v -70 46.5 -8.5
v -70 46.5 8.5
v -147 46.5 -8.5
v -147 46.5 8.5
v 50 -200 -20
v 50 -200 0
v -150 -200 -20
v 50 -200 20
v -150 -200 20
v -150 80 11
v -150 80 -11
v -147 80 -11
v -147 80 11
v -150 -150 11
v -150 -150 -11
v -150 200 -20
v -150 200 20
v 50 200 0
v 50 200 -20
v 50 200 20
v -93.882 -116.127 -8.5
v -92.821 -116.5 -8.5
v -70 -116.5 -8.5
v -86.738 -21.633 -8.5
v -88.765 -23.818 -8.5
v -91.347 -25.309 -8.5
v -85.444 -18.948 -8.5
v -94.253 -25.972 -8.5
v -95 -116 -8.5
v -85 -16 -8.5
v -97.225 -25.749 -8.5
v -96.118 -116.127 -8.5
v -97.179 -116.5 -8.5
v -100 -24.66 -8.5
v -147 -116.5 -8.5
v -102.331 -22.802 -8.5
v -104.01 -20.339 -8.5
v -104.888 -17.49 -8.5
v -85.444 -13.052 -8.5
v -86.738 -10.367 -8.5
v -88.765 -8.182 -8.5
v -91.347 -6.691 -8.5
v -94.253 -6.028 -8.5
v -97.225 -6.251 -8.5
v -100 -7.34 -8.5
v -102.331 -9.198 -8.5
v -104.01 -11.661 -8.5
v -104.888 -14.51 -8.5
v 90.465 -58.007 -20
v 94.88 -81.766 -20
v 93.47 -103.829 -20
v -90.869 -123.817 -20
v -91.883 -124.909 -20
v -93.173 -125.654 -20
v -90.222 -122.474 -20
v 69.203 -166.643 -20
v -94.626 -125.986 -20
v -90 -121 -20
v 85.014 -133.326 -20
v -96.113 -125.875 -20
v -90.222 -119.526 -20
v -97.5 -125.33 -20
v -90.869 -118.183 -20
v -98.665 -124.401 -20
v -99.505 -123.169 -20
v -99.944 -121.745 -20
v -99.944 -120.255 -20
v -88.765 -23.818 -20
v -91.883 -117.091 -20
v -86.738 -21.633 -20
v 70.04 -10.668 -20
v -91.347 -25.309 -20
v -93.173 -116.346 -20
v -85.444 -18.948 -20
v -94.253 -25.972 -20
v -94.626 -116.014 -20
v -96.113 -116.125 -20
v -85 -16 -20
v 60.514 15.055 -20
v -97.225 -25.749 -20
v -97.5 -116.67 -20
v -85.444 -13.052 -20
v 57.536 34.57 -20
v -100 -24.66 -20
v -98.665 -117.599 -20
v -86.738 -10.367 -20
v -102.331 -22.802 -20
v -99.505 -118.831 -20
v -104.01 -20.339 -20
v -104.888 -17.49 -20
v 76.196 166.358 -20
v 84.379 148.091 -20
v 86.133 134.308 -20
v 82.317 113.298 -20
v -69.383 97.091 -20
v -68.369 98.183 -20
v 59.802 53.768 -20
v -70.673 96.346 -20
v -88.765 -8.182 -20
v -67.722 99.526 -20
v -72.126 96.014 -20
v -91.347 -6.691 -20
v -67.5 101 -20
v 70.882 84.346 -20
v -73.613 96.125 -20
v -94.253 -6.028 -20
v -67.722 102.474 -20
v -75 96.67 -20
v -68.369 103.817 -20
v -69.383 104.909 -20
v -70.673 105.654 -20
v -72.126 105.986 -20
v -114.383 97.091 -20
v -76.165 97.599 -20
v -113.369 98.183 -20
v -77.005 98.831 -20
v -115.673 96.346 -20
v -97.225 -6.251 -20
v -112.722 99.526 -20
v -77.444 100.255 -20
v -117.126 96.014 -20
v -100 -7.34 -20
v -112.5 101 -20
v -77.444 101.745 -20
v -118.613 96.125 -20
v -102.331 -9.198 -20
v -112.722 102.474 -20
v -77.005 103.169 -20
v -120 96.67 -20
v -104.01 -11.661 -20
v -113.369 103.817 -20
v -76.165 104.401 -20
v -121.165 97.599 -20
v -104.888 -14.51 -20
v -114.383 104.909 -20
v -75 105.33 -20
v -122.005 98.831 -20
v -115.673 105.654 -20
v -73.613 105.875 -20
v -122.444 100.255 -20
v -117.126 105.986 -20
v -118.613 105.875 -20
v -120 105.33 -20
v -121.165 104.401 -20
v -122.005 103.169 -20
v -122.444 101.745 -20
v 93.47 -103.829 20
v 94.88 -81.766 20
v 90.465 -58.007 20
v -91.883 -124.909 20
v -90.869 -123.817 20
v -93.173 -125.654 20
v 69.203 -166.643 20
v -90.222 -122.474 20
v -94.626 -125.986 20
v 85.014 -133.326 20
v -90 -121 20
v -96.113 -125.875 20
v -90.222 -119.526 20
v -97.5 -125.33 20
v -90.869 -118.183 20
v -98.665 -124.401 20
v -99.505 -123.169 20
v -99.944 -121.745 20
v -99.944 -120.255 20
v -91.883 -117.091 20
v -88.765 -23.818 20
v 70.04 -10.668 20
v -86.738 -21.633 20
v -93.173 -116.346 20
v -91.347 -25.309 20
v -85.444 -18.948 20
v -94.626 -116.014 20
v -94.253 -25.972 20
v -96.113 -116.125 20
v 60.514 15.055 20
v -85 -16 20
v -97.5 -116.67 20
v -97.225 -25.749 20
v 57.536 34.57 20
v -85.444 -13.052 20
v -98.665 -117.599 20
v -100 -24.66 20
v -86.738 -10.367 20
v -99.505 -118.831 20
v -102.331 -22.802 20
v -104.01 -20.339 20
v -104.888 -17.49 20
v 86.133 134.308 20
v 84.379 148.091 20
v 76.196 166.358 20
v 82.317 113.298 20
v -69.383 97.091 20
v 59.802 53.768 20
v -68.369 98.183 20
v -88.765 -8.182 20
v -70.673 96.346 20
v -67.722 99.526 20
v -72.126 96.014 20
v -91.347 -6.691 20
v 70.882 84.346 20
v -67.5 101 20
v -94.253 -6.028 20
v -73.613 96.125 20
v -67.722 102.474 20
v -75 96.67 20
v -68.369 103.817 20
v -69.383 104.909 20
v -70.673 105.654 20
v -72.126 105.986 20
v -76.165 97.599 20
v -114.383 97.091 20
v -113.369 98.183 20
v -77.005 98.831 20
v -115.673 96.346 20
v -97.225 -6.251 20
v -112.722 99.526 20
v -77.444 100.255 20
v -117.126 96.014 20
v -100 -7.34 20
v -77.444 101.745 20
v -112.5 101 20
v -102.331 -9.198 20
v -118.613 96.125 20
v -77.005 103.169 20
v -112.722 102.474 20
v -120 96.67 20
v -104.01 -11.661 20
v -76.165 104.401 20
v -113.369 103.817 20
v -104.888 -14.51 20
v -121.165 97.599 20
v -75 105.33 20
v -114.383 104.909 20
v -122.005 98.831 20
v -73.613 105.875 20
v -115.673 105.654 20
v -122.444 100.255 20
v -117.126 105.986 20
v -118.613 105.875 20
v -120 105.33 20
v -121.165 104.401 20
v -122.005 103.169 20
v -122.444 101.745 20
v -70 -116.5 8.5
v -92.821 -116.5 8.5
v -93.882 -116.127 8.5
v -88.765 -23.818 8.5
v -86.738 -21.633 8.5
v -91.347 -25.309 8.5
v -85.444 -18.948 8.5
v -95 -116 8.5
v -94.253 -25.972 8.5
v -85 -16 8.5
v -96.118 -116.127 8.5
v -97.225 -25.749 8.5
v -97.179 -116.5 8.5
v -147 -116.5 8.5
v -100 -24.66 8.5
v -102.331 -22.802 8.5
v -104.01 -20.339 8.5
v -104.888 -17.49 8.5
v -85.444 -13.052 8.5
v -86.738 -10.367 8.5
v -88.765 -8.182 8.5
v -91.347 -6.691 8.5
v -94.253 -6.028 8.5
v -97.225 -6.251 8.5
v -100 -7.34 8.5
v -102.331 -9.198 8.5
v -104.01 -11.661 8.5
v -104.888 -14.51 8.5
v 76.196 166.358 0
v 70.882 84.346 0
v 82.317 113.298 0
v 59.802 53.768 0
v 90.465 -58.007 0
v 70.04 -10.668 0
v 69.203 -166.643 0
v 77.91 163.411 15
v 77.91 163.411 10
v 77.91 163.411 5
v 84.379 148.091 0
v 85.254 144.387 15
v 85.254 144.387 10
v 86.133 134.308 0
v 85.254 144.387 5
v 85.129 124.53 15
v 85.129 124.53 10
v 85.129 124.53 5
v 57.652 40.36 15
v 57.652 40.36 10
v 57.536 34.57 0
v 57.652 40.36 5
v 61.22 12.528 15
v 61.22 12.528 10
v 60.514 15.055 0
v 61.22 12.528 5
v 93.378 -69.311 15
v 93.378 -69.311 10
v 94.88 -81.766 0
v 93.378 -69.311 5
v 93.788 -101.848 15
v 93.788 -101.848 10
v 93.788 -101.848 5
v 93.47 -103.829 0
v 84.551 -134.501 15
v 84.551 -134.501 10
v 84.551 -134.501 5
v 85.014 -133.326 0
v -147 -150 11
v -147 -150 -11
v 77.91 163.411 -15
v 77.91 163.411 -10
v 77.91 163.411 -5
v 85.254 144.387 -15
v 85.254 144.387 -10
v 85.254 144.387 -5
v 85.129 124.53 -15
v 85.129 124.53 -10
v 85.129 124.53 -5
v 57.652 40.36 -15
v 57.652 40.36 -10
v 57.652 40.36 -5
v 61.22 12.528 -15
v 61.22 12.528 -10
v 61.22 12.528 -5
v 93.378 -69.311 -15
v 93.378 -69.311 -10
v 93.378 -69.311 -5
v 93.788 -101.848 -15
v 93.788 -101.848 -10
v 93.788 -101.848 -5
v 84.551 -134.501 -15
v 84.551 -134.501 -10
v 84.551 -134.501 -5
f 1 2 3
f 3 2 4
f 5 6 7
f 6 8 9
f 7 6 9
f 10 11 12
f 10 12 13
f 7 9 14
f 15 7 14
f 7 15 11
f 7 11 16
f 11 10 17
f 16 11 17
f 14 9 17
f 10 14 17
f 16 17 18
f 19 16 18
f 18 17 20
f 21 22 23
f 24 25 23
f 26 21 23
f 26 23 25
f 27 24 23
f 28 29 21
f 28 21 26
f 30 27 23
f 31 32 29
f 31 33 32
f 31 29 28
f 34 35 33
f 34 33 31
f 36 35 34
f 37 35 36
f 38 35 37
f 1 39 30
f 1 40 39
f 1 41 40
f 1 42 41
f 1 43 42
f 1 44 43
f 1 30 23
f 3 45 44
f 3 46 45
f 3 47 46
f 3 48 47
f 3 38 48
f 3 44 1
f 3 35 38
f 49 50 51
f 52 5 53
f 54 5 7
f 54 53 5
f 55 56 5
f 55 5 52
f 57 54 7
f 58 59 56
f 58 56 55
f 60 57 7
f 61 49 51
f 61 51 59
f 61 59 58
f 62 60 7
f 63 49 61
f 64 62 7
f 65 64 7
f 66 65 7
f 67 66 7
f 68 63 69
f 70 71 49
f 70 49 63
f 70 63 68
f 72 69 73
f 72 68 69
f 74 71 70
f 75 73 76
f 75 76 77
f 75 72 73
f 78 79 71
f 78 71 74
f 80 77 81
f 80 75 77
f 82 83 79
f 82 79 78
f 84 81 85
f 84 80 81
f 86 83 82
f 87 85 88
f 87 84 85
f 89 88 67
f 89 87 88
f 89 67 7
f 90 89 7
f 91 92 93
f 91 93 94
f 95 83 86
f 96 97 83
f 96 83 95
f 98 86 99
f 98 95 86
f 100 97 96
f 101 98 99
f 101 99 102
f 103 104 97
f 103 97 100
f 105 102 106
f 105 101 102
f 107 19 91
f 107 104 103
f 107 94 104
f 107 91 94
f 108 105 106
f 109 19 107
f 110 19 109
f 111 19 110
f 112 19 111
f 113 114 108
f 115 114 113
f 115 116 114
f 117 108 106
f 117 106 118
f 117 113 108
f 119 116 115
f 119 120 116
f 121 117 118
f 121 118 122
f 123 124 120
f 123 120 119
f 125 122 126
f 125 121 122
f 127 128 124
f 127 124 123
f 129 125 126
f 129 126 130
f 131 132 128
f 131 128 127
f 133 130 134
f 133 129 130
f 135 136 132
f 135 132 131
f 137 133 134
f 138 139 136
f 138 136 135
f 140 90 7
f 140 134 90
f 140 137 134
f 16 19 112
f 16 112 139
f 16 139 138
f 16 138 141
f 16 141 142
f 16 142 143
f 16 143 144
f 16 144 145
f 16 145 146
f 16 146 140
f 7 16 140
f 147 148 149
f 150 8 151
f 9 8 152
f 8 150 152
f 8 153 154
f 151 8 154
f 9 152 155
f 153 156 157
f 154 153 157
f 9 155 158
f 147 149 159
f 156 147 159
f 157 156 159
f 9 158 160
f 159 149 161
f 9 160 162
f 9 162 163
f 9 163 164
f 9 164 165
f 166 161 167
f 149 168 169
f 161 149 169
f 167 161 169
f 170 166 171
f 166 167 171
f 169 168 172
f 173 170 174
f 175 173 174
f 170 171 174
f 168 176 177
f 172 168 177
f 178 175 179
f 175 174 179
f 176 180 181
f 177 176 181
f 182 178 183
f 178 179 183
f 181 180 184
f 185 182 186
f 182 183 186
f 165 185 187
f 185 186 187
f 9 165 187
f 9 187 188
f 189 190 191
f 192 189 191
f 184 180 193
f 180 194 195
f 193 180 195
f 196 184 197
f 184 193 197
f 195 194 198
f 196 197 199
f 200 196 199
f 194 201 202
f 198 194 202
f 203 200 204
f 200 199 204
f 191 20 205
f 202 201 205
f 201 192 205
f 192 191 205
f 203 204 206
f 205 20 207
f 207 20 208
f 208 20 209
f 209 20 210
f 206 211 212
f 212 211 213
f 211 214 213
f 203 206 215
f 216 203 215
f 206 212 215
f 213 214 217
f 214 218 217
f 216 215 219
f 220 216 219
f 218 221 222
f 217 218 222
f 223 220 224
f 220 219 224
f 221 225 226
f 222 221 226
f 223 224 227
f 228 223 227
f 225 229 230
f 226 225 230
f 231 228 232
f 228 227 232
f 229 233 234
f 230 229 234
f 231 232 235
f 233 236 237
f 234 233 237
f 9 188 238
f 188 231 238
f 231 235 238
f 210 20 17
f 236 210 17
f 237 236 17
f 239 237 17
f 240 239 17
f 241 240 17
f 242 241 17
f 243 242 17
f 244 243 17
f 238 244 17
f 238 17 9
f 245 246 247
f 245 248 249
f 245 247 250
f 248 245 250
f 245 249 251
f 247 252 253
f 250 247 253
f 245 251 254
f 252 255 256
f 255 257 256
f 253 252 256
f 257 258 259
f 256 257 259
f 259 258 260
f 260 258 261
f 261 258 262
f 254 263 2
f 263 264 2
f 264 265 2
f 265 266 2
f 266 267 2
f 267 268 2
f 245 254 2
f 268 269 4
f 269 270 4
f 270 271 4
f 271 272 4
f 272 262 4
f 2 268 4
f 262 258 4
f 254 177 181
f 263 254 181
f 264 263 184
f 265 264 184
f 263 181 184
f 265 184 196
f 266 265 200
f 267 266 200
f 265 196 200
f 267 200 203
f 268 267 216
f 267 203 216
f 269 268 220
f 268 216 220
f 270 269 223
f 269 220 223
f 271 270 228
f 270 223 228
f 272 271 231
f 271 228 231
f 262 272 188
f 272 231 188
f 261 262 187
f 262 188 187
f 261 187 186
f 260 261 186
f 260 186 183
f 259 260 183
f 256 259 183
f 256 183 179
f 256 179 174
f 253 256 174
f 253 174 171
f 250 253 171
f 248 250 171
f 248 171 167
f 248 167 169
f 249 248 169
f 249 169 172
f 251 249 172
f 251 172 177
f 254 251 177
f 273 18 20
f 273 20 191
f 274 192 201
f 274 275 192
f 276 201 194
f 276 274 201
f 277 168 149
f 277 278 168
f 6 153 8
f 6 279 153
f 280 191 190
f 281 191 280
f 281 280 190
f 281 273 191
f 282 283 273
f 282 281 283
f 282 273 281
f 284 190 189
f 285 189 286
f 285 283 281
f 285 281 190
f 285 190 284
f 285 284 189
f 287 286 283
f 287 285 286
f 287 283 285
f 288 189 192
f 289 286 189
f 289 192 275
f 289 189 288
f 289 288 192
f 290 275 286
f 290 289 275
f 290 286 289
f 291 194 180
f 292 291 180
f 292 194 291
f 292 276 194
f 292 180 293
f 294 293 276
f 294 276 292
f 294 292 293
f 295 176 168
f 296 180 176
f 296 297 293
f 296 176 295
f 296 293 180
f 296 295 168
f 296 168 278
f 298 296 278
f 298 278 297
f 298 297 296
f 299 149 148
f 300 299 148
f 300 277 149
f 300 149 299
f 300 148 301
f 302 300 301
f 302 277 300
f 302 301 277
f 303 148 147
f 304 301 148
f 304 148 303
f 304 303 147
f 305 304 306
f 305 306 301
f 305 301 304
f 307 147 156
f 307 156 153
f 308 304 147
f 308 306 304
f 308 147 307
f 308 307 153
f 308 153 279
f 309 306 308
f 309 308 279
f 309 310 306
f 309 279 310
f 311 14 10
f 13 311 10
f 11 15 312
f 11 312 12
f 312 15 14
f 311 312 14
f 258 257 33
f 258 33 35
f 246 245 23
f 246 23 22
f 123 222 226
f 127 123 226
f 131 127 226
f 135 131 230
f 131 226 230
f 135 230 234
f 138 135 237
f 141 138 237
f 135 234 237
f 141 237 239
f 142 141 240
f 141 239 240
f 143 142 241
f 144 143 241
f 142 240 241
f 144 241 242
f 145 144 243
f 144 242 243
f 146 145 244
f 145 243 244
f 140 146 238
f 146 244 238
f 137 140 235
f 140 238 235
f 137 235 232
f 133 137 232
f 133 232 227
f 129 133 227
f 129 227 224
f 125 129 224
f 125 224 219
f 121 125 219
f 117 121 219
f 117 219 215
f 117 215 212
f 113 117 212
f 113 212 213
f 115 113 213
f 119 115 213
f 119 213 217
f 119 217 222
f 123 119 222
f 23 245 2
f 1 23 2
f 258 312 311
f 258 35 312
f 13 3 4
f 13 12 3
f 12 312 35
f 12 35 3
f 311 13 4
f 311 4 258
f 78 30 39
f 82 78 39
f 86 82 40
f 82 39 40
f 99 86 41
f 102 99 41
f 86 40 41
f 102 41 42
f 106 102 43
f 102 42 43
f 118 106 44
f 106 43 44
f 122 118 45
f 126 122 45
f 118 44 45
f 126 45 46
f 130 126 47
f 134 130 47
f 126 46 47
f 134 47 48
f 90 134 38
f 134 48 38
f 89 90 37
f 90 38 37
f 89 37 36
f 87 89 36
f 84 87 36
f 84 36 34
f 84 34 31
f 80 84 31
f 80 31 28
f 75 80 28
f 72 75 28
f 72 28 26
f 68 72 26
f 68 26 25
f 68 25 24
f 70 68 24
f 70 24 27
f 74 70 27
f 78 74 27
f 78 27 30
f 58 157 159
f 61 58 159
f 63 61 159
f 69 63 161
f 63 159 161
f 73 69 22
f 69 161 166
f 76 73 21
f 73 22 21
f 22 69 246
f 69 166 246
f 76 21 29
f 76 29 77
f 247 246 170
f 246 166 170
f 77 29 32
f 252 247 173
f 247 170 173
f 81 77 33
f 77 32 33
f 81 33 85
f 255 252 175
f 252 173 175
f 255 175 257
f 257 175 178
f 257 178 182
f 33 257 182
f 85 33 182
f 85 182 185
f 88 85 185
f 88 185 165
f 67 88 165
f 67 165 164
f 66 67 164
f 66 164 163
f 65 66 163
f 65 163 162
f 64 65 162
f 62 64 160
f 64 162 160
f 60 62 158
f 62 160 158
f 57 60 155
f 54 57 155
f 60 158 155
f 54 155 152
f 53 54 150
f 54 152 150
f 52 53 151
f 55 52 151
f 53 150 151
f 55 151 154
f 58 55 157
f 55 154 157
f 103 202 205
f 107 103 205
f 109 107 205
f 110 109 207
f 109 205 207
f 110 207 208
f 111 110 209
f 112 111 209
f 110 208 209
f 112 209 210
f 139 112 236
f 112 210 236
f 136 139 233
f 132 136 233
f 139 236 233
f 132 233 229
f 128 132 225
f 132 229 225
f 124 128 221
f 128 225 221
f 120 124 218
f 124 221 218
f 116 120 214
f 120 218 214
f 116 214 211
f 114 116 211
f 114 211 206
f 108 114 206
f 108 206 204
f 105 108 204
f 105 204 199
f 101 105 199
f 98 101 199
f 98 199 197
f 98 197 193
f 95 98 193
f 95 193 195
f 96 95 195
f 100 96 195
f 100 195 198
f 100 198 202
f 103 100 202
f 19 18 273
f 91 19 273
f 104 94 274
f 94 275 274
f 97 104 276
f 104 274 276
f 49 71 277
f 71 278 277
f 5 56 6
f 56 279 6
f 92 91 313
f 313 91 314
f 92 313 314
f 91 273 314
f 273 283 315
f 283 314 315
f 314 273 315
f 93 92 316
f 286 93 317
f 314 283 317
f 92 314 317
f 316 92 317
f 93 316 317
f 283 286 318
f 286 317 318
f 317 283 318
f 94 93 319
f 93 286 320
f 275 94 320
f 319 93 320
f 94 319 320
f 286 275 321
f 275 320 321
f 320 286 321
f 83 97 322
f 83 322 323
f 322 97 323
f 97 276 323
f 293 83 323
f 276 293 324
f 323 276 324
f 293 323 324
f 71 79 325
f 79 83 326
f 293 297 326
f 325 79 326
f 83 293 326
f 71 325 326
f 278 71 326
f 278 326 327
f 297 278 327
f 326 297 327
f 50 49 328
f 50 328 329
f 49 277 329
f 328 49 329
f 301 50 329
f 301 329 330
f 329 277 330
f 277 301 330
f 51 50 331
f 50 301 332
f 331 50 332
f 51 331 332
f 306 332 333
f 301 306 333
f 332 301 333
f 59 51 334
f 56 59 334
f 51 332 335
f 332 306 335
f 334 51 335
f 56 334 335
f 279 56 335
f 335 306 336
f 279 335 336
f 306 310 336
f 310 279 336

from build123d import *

# Parameters (mm, degrees)
EXTRUSION1_DEPTH        = 20
ESQUISSE2_W             = 22
ESQUISSE2_H             = 230
ENL_V_MAT_EXTRU_1_DEPTH = 3
ESQUISSE3_W             = 163
ESQUISSE3_H             = 77
ENL_V_MAT_EXTRU_2_DEPTH = 8.5
ESQUISSE4_R             = 10
ESQUISSE4_R_2           = 5
ENL_V_MAT_EXTRU_3_DEPTH = 41.0000001


with BuildPart() as part:
    # Esquisse1 → Extrusion1 (new body, symmetric)
    with BuildSketch(Plane.XY):
        with BuildLine():
            Line((-150, 200), (50, 200))
            add(Edge.make_bspline(
                [(50, 200), (66.879560662, 180.562572919), (108.794009551, 132.296562907), (27.278256401, 35.236557066), (123.473848535, -75.99379889), (75.892612143, -156.299492504), (50, -200)],
                knots=[0, 0, 0, 0, 0.163803914, 0.406749376, 0.677166684, 1, 1, 1, 1], degree=3))
            Line((50, -200), (-150, -200))
            Line((-150, -200), (-150, 200))
        make_face()
    extrude(amount=EXTRUSION1_DEPTH, both=True)

    # Esquisse2 → Enlèv. mat.-Extru.1 (cut)
    with BuildSketch(Plane.ZY.offset(150)):
        with Locations((0, -35)):
            Rectangle(ESQUISSE2_W, ESQUISSE2_H)
    extrude(amount=-ENL_V_MAT_EXTRU_1_DEPTH, mode=Mode.SUBTRACT)

    # Esquisse3 → Enlèv. mat.-Extru.2 (cut, symmetric)
    with BuildSketch(Plane(origin=(37.152504758, -36.321343777, 0), x_dir=(0, 1, 0), z_dir=(0, 0, 1))):
        with Locations((1.321343777, 145.652504758)):
            Rectangle(ESQUISSE3_W, ESQUISSE3_H)
    extrude(amount=ENL_V_MAT_EXTRU_2_DEPTH, both=True, mode=Mode.SUBTRACT)

    # Esquisse4 → Enlèv. mat.-Extru.3 (cut, through all)
    with BuildSketch(Plane.XY.offset(20)):
        with Locations((-95, -16)):
            Circle(ESQUISSE4_R)
        with Locations((-117.5, 101)):
            Circle(ESQUISSE4_R_2)
        with Locations((-95, -121)):
            Circle(ESQUISSE4_R_2)
        with Locations((-72.5, 101)):
            Circle(ESQUISSE4_R_2)
    extrude(amount=-ENL_V_MAT_EXTRU_3_DEPTH, mode=Mode.SUBTRACT)


solid = part.part
